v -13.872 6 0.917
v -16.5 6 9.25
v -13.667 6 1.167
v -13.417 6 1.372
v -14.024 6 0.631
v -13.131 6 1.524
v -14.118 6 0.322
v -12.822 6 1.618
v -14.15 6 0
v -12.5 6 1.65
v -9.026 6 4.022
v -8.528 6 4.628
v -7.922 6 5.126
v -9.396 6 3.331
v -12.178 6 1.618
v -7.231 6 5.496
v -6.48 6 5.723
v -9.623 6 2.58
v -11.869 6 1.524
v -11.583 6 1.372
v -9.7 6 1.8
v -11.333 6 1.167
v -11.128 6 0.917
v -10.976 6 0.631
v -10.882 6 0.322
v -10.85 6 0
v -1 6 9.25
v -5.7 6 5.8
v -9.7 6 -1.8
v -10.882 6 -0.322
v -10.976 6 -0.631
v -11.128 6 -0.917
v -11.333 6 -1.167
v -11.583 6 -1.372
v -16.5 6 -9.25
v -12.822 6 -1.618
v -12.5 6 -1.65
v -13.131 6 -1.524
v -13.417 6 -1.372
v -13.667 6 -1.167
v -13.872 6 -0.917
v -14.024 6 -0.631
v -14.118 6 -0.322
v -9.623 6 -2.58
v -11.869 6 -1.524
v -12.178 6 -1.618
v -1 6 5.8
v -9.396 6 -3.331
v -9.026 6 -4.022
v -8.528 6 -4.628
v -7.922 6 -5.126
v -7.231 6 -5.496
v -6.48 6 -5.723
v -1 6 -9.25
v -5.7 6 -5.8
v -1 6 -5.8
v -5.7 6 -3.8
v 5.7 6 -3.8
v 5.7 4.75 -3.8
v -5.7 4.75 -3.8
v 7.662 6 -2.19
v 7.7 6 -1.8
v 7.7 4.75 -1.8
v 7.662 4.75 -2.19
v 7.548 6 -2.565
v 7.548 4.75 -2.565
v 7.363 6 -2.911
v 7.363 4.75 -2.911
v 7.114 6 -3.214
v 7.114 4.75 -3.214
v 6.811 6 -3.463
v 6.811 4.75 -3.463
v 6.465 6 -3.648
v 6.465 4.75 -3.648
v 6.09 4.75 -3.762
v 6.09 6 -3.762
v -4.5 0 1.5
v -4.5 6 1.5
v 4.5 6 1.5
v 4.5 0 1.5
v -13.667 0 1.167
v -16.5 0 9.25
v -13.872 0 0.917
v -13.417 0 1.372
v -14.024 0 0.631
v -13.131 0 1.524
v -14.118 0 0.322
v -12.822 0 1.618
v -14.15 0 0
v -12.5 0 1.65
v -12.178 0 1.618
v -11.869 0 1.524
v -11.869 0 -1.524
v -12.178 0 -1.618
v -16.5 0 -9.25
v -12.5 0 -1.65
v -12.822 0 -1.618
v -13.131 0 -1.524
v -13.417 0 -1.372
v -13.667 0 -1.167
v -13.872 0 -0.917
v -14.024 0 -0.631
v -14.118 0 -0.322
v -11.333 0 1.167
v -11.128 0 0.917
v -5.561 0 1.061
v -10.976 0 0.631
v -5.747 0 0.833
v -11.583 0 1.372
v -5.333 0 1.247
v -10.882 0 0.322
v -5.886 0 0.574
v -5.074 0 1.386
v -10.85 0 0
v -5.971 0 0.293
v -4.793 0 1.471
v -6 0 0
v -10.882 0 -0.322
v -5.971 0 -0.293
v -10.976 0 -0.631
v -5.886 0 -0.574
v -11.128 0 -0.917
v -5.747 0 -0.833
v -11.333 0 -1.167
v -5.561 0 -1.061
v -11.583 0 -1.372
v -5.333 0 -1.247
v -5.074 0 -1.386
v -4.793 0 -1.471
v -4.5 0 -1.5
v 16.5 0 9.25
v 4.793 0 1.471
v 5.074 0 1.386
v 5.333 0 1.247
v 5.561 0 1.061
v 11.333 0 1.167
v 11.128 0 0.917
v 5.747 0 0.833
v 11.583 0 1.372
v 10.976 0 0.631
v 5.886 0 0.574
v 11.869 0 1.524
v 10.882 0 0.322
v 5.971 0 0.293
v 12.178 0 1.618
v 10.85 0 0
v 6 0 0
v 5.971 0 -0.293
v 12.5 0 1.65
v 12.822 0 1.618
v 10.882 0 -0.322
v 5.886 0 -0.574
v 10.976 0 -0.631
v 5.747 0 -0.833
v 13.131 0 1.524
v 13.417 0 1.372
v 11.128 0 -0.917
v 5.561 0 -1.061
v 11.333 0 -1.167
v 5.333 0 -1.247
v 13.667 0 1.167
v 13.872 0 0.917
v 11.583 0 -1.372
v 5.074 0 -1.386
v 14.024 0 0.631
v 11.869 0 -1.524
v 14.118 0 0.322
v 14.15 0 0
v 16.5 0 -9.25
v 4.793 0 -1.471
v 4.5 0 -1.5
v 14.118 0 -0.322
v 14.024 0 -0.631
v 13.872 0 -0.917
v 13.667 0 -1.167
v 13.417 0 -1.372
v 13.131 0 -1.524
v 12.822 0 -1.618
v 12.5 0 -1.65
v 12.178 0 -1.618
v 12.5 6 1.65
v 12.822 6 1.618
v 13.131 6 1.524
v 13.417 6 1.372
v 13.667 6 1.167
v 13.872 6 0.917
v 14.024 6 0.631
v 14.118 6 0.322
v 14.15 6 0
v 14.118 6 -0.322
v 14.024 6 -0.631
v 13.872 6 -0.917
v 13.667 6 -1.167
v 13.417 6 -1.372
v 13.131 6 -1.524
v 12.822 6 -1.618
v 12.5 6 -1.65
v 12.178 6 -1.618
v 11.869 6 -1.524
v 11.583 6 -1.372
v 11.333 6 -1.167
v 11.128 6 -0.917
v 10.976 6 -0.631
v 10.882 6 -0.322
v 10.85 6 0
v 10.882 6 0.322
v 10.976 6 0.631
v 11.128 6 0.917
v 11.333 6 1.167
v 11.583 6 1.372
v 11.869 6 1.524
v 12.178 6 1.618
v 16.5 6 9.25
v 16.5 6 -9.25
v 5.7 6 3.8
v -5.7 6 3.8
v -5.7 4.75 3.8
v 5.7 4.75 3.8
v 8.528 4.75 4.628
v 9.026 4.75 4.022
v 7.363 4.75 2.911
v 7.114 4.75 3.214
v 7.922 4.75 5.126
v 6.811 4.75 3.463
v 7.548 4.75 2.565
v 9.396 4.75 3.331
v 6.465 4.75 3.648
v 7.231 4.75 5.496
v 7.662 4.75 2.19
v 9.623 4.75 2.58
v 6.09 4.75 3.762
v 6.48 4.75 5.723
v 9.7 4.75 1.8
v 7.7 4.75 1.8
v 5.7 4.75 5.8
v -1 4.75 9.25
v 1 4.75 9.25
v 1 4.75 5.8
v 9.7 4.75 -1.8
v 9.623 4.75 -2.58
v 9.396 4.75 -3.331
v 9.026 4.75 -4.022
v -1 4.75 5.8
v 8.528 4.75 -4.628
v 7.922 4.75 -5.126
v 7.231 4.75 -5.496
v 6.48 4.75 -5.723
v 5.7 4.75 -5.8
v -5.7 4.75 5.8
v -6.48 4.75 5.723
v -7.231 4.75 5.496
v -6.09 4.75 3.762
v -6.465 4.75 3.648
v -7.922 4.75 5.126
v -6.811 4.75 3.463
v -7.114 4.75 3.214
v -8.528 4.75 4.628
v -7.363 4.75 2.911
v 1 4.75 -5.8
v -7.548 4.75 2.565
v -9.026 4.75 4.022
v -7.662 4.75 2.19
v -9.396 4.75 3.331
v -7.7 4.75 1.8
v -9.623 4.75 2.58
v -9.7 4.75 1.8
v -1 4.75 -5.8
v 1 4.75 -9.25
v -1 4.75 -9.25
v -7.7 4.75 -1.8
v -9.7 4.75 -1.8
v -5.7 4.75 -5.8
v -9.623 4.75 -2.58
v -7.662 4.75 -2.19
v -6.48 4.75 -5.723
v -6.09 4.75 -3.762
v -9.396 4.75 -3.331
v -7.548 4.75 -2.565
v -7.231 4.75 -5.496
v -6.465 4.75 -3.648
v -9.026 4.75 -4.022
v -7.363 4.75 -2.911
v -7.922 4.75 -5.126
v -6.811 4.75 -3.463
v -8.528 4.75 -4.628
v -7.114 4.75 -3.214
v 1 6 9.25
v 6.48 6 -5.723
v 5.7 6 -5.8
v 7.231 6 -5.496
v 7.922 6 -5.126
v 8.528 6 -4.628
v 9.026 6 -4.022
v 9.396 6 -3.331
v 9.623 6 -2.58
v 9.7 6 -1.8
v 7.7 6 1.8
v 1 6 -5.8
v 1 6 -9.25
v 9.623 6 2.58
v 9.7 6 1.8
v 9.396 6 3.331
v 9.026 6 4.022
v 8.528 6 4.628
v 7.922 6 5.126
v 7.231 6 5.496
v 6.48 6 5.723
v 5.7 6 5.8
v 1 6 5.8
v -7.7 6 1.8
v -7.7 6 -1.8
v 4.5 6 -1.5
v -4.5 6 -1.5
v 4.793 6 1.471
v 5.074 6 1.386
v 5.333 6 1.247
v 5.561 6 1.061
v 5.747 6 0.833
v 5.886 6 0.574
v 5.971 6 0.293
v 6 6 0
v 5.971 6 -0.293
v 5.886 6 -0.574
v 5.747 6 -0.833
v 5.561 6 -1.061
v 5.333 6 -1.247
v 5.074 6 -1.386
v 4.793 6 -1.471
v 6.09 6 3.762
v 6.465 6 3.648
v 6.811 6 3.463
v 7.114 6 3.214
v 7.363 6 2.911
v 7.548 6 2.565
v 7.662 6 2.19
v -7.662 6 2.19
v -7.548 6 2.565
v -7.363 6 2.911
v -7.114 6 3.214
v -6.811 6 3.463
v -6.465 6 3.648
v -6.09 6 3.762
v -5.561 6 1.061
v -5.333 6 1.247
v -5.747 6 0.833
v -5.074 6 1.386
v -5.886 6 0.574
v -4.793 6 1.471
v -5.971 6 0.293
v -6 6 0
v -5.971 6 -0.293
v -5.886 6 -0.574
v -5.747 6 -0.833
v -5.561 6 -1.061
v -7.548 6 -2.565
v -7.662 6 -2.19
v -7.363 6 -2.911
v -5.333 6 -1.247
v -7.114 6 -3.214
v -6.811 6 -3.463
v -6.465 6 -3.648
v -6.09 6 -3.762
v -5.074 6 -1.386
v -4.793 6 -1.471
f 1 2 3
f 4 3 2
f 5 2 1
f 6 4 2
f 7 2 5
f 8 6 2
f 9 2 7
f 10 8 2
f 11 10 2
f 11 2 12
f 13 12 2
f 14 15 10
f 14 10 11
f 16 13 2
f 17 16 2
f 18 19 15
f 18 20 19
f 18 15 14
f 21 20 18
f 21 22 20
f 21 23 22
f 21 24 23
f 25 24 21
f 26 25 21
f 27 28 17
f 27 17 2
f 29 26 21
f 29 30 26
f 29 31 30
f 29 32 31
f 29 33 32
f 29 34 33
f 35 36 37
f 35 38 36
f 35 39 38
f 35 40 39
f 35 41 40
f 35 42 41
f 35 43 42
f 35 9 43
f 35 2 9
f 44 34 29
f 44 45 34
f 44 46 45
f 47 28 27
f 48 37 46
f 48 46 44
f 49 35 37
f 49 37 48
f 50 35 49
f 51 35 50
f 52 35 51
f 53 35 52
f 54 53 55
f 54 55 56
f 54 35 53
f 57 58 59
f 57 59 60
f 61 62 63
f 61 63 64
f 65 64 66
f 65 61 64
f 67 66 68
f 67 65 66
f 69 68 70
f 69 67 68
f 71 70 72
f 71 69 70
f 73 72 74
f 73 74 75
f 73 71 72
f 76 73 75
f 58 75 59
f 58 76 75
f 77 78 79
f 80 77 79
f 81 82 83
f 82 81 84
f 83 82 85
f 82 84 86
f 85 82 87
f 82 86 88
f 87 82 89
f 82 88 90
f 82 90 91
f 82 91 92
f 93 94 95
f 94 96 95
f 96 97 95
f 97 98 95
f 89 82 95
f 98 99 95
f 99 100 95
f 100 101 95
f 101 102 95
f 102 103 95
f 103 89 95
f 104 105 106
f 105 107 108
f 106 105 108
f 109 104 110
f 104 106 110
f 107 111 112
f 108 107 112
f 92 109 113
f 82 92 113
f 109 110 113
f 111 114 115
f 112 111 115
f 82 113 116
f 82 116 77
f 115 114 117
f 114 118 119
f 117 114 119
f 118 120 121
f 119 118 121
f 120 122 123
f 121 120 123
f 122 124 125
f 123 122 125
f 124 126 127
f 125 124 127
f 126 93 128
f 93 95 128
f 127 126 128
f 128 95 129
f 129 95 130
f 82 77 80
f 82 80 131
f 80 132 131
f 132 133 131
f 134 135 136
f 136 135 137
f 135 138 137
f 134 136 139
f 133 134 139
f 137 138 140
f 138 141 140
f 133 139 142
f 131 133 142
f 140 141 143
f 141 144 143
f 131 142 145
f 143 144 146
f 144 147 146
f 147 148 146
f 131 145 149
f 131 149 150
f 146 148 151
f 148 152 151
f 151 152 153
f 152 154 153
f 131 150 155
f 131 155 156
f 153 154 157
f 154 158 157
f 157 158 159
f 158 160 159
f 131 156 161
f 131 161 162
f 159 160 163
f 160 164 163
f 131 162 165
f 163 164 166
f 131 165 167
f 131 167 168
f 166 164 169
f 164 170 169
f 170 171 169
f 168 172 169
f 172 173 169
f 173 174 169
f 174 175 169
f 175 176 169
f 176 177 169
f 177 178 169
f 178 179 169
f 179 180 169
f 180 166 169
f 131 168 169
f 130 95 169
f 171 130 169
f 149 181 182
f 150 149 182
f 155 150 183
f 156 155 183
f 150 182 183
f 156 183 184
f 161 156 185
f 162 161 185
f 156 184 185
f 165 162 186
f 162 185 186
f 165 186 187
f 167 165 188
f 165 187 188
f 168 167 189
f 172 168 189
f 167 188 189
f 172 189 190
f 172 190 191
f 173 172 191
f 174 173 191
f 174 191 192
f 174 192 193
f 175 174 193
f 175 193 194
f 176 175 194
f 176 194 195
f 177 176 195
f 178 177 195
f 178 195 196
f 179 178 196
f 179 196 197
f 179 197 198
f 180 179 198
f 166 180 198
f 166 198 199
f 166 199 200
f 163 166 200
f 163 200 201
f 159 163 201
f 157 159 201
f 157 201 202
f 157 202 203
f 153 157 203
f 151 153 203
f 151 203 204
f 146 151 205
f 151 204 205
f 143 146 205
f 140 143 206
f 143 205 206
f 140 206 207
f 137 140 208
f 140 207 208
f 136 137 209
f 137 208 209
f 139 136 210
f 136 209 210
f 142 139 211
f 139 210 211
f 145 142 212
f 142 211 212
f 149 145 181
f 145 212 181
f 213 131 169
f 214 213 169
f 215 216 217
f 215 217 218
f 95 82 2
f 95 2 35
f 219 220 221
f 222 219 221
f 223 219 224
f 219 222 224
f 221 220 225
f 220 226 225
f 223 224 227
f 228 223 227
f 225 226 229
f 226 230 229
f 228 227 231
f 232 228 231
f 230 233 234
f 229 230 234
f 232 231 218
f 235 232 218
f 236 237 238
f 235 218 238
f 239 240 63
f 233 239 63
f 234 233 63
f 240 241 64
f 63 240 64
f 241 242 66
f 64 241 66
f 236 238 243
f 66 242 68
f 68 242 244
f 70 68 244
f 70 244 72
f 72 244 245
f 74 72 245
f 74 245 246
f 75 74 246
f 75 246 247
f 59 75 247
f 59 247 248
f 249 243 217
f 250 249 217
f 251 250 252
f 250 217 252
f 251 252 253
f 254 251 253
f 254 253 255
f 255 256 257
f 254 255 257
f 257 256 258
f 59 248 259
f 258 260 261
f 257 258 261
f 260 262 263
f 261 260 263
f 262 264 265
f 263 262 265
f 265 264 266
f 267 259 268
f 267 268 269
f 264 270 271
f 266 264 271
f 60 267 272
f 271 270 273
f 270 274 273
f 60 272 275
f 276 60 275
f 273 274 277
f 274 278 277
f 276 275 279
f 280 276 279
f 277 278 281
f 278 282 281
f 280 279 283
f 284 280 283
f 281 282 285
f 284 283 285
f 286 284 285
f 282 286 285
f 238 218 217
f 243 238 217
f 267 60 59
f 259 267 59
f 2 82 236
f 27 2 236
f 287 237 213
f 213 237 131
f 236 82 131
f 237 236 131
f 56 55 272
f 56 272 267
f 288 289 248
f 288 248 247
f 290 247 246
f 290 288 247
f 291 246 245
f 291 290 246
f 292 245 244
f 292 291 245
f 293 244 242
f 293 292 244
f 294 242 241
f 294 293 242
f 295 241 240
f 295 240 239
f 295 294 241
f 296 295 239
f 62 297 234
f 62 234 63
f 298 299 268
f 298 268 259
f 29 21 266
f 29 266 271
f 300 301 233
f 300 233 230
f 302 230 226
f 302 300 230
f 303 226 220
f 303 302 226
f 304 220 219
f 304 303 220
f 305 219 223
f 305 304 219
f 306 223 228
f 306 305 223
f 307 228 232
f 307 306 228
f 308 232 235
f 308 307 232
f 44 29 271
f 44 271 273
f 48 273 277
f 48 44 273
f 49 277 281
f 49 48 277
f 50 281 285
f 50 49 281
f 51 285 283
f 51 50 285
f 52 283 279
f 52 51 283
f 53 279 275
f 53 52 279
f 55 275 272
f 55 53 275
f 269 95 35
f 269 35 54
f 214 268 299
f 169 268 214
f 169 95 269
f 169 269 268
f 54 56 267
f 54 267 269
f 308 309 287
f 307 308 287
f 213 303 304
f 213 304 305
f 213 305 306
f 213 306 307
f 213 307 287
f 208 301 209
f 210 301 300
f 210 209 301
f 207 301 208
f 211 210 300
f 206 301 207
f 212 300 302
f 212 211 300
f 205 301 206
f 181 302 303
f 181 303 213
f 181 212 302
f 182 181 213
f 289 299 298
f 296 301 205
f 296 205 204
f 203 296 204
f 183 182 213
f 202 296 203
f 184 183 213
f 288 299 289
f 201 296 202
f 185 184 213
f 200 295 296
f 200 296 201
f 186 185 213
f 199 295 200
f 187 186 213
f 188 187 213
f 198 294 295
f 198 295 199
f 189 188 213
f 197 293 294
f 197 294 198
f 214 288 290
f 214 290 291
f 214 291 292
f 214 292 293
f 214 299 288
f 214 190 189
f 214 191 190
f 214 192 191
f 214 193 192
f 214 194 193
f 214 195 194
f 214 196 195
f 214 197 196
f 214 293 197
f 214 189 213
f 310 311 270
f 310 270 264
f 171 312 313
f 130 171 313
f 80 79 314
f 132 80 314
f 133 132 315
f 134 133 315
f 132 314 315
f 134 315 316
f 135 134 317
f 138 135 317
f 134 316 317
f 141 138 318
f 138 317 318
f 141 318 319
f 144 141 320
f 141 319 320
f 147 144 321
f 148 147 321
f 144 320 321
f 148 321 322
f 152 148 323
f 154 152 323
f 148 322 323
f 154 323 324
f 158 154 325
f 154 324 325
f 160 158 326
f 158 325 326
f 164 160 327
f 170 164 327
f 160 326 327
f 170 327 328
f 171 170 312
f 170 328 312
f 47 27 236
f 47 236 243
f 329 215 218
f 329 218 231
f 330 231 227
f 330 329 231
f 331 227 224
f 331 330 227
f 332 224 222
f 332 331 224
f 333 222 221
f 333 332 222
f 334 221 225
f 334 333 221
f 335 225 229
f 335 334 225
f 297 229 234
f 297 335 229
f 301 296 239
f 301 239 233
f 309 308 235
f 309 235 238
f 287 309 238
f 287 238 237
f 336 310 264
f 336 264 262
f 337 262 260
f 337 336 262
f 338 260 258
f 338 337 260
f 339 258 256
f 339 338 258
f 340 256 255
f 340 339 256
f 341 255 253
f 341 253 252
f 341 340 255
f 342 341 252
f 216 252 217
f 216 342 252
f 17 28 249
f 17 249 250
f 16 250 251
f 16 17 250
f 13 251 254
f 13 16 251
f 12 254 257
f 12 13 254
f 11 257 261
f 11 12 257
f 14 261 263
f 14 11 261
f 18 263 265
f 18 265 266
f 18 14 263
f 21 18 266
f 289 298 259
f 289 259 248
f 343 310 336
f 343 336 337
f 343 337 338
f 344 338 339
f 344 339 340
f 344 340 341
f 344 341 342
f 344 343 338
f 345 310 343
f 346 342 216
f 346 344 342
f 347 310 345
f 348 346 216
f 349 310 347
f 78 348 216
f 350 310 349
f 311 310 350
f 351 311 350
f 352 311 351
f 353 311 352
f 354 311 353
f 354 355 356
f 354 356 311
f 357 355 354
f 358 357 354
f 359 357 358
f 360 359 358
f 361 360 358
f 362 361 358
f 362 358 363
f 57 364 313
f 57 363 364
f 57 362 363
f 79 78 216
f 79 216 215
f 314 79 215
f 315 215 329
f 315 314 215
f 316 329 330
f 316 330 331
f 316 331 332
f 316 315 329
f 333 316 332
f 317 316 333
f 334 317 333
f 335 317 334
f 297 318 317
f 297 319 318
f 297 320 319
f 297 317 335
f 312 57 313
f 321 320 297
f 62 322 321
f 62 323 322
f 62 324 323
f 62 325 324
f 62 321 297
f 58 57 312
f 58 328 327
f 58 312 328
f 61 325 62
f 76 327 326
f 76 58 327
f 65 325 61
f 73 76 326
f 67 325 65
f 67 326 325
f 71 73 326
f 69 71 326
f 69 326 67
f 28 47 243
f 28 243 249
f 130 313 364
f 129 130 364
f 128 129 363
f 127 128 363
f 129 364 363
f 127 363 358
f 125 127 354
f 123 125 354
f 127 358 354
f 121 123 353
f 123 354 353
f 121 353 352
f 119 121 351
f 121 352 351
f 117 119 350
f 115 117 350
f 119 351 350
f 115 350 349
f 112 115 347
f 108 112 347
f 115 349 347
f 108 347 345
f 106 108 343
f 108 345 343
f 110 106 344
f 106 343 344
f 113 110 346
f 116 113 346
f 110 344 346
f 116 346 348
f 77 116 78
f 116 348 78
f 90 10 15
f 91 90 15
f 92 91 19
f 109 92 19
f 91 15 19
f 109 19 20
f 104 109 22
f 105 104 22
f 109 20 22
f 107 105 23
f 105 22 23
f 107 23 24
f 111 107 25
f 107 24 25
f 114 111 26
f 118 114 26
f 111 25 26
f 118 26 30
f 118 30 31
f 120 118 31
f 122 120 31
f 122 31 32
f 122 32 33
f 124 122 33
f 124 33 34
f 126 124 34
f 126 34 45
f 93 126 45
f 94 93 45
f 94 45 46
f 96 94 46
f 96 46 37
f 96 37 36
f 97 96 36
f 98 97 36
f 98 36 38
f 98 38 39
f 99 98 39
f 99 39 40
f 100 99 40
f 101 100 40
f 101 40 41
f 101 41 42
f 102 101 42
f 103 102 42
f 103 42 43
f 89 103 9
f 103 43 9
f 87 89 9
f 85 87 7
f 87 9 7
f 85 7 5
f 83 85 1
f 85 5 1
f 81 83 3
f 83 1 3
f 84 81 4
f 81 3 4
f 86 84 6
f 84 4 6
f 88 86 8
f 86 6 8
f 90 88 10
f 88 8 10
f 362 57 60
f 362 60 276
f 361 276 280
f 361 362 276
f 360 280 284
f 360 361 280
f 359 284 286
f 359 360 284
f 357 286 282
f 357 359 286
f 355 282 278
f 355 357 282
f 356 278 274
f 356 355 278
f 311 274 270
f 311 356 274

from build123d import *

# Parameters (mm, degrees)
SKETCH2_W           = 33
SKETCH2_H           = 18.5
BOSS_EXTRUDE1_DEPTH = 6
CUT_EXTRUDE1_DEPTH  = 1.25
SKETCH4_R           = 1.65
CUT_EXTRUDE2_DEPTH  = 20.844709622
CUT_EXTRUDE3_DEPTH  = 20.844709622


with BuildPart() as part:
    # Sketch2 → Boss-Extrude1 (new body)
    with BuildSketch(Plane(origin=(0, 0, 0), x_dir=(1, 0, 0), z_dir=(0, 1, 0))):
        Rectangle(SKETCH2_W, SKETCH2_H)
    extrude(amount=BOSS_EXTRUDE1_DEPTH)

    # Sketch3 → Cut-Extrude1 (cut)
    with BuildSketch(Plane(origin=(0, 6, 0), x_dir=(1, 0, 0), z_dir=(0, 1, 0))):
        with BuildLine():
            Line((-1, 9.25), (1, 9.25))
            Line((1, 9.25), (1, 5.8))
            Line((1, 5.8), (5.7, 5.8))
            ThreePointArc((5.7, 5.8), (8.528427125, 4.628427125), (9.7, 1.8))
            Line((9.7, 1.8), (9.7, -1.8))
            ThreePointArc((9.7, -1.8), (8.528427125, -4.628427125), (5.7, -5.8))
            Line((5.7, -5.8), (1, -5.8))
            Line((1, -5.8), (1, -9.25))
            Line((1, -9.25), (-1, -9.25))
            Line((-1, -9.25), (-1, -5.8))
            Line((-1, -5.8), (-5.7, -5.8))
            ThreePointArc((-5.7, -5.8), (-8.528427125, -4.628427125), (-9.7, -1.8))
            Line((-9.7, -1.8), (-9.7, 1.8))
            ThreePointArc((-9.7, 1.8), (-8.528427125, 4.628427125), (-5.7, 5.8))
            Line((-5.7, 5.8), (-1, 5.8))
            Line((-1, 5.8), (-1, 9.25))
        make_face()
        with BuildLine():
            Line((-5.7, -3.8), (5.7, -3.8))
            ThreePointArc((5.7, -3.8), (7.114213562, -3.214213562), (7.7, -1.8))
            Line((7.7, -1.8), (7.7, 1.8))
            ThreePointArc((7.7, 1.8), (7.114213562, 3.214213562), (5.7, 3.8))
            Line((5.7, 3.8), (-5.7, 3.8))
            ThreePointArc((-5.7, 3.8), (-7.114213562, 3.214213562), (-7.7, 1.8))
            Line((-7.7, 1.8), (-7.7, -1.8))
            ThreePointArc((-7.7, -1.8), (-7.114213562, -3.214213562), (-5.7, -3.8))
        make_face(mode=Mode.SUBTRACT)
    extrude(amount=-CUT_EXTRUDE1_DEPTH, mode=Mode.SUBTRACT)

    # Sketch4 → Cut-Extrude2 (cut, through all)
    with BuildSketch(Plane(origin=(0, 6, 0), x_dir=(1, 0, 0), z_dir=(0, 1, 0))):
        with Locations(Location((-12.5, 0, 0), (0, 0, 270))):
            Circle(SKETCH4_R)
        with Locations(Location((12.5, 0, 0), (0, 0, 270))):
            Circle(SKETCH4_R)
    extrude(amount=-CUT_EXTRUDE2_DEPTH, mode=Mode.SUBTRACT)

    # Sketch5 → Cut-Extrude3 (cut, through all)
    with BuildSketch(Plane(origin=(0, 6, 0), x_dir=(1, 0, 0), z_dir=(0, 1, 0))):
        with BuildLine():
            Line((-4.5, -1.5), (4.5, -1.5))
            ThreePointArc((4.5, -1.5), (6, 0), (4.5, 1.5))
            Line((4.5, 1.5), (-4.5, 1.5))
            ThreePointArc((-4.5, 1.5), (-6, 0), (-4.5, -1.5))
        make_face()
    extrude(amount=-CUT_EXTRUDE3_DEPTH, mode=Mode.SUBTRACT)


solid = part.part
